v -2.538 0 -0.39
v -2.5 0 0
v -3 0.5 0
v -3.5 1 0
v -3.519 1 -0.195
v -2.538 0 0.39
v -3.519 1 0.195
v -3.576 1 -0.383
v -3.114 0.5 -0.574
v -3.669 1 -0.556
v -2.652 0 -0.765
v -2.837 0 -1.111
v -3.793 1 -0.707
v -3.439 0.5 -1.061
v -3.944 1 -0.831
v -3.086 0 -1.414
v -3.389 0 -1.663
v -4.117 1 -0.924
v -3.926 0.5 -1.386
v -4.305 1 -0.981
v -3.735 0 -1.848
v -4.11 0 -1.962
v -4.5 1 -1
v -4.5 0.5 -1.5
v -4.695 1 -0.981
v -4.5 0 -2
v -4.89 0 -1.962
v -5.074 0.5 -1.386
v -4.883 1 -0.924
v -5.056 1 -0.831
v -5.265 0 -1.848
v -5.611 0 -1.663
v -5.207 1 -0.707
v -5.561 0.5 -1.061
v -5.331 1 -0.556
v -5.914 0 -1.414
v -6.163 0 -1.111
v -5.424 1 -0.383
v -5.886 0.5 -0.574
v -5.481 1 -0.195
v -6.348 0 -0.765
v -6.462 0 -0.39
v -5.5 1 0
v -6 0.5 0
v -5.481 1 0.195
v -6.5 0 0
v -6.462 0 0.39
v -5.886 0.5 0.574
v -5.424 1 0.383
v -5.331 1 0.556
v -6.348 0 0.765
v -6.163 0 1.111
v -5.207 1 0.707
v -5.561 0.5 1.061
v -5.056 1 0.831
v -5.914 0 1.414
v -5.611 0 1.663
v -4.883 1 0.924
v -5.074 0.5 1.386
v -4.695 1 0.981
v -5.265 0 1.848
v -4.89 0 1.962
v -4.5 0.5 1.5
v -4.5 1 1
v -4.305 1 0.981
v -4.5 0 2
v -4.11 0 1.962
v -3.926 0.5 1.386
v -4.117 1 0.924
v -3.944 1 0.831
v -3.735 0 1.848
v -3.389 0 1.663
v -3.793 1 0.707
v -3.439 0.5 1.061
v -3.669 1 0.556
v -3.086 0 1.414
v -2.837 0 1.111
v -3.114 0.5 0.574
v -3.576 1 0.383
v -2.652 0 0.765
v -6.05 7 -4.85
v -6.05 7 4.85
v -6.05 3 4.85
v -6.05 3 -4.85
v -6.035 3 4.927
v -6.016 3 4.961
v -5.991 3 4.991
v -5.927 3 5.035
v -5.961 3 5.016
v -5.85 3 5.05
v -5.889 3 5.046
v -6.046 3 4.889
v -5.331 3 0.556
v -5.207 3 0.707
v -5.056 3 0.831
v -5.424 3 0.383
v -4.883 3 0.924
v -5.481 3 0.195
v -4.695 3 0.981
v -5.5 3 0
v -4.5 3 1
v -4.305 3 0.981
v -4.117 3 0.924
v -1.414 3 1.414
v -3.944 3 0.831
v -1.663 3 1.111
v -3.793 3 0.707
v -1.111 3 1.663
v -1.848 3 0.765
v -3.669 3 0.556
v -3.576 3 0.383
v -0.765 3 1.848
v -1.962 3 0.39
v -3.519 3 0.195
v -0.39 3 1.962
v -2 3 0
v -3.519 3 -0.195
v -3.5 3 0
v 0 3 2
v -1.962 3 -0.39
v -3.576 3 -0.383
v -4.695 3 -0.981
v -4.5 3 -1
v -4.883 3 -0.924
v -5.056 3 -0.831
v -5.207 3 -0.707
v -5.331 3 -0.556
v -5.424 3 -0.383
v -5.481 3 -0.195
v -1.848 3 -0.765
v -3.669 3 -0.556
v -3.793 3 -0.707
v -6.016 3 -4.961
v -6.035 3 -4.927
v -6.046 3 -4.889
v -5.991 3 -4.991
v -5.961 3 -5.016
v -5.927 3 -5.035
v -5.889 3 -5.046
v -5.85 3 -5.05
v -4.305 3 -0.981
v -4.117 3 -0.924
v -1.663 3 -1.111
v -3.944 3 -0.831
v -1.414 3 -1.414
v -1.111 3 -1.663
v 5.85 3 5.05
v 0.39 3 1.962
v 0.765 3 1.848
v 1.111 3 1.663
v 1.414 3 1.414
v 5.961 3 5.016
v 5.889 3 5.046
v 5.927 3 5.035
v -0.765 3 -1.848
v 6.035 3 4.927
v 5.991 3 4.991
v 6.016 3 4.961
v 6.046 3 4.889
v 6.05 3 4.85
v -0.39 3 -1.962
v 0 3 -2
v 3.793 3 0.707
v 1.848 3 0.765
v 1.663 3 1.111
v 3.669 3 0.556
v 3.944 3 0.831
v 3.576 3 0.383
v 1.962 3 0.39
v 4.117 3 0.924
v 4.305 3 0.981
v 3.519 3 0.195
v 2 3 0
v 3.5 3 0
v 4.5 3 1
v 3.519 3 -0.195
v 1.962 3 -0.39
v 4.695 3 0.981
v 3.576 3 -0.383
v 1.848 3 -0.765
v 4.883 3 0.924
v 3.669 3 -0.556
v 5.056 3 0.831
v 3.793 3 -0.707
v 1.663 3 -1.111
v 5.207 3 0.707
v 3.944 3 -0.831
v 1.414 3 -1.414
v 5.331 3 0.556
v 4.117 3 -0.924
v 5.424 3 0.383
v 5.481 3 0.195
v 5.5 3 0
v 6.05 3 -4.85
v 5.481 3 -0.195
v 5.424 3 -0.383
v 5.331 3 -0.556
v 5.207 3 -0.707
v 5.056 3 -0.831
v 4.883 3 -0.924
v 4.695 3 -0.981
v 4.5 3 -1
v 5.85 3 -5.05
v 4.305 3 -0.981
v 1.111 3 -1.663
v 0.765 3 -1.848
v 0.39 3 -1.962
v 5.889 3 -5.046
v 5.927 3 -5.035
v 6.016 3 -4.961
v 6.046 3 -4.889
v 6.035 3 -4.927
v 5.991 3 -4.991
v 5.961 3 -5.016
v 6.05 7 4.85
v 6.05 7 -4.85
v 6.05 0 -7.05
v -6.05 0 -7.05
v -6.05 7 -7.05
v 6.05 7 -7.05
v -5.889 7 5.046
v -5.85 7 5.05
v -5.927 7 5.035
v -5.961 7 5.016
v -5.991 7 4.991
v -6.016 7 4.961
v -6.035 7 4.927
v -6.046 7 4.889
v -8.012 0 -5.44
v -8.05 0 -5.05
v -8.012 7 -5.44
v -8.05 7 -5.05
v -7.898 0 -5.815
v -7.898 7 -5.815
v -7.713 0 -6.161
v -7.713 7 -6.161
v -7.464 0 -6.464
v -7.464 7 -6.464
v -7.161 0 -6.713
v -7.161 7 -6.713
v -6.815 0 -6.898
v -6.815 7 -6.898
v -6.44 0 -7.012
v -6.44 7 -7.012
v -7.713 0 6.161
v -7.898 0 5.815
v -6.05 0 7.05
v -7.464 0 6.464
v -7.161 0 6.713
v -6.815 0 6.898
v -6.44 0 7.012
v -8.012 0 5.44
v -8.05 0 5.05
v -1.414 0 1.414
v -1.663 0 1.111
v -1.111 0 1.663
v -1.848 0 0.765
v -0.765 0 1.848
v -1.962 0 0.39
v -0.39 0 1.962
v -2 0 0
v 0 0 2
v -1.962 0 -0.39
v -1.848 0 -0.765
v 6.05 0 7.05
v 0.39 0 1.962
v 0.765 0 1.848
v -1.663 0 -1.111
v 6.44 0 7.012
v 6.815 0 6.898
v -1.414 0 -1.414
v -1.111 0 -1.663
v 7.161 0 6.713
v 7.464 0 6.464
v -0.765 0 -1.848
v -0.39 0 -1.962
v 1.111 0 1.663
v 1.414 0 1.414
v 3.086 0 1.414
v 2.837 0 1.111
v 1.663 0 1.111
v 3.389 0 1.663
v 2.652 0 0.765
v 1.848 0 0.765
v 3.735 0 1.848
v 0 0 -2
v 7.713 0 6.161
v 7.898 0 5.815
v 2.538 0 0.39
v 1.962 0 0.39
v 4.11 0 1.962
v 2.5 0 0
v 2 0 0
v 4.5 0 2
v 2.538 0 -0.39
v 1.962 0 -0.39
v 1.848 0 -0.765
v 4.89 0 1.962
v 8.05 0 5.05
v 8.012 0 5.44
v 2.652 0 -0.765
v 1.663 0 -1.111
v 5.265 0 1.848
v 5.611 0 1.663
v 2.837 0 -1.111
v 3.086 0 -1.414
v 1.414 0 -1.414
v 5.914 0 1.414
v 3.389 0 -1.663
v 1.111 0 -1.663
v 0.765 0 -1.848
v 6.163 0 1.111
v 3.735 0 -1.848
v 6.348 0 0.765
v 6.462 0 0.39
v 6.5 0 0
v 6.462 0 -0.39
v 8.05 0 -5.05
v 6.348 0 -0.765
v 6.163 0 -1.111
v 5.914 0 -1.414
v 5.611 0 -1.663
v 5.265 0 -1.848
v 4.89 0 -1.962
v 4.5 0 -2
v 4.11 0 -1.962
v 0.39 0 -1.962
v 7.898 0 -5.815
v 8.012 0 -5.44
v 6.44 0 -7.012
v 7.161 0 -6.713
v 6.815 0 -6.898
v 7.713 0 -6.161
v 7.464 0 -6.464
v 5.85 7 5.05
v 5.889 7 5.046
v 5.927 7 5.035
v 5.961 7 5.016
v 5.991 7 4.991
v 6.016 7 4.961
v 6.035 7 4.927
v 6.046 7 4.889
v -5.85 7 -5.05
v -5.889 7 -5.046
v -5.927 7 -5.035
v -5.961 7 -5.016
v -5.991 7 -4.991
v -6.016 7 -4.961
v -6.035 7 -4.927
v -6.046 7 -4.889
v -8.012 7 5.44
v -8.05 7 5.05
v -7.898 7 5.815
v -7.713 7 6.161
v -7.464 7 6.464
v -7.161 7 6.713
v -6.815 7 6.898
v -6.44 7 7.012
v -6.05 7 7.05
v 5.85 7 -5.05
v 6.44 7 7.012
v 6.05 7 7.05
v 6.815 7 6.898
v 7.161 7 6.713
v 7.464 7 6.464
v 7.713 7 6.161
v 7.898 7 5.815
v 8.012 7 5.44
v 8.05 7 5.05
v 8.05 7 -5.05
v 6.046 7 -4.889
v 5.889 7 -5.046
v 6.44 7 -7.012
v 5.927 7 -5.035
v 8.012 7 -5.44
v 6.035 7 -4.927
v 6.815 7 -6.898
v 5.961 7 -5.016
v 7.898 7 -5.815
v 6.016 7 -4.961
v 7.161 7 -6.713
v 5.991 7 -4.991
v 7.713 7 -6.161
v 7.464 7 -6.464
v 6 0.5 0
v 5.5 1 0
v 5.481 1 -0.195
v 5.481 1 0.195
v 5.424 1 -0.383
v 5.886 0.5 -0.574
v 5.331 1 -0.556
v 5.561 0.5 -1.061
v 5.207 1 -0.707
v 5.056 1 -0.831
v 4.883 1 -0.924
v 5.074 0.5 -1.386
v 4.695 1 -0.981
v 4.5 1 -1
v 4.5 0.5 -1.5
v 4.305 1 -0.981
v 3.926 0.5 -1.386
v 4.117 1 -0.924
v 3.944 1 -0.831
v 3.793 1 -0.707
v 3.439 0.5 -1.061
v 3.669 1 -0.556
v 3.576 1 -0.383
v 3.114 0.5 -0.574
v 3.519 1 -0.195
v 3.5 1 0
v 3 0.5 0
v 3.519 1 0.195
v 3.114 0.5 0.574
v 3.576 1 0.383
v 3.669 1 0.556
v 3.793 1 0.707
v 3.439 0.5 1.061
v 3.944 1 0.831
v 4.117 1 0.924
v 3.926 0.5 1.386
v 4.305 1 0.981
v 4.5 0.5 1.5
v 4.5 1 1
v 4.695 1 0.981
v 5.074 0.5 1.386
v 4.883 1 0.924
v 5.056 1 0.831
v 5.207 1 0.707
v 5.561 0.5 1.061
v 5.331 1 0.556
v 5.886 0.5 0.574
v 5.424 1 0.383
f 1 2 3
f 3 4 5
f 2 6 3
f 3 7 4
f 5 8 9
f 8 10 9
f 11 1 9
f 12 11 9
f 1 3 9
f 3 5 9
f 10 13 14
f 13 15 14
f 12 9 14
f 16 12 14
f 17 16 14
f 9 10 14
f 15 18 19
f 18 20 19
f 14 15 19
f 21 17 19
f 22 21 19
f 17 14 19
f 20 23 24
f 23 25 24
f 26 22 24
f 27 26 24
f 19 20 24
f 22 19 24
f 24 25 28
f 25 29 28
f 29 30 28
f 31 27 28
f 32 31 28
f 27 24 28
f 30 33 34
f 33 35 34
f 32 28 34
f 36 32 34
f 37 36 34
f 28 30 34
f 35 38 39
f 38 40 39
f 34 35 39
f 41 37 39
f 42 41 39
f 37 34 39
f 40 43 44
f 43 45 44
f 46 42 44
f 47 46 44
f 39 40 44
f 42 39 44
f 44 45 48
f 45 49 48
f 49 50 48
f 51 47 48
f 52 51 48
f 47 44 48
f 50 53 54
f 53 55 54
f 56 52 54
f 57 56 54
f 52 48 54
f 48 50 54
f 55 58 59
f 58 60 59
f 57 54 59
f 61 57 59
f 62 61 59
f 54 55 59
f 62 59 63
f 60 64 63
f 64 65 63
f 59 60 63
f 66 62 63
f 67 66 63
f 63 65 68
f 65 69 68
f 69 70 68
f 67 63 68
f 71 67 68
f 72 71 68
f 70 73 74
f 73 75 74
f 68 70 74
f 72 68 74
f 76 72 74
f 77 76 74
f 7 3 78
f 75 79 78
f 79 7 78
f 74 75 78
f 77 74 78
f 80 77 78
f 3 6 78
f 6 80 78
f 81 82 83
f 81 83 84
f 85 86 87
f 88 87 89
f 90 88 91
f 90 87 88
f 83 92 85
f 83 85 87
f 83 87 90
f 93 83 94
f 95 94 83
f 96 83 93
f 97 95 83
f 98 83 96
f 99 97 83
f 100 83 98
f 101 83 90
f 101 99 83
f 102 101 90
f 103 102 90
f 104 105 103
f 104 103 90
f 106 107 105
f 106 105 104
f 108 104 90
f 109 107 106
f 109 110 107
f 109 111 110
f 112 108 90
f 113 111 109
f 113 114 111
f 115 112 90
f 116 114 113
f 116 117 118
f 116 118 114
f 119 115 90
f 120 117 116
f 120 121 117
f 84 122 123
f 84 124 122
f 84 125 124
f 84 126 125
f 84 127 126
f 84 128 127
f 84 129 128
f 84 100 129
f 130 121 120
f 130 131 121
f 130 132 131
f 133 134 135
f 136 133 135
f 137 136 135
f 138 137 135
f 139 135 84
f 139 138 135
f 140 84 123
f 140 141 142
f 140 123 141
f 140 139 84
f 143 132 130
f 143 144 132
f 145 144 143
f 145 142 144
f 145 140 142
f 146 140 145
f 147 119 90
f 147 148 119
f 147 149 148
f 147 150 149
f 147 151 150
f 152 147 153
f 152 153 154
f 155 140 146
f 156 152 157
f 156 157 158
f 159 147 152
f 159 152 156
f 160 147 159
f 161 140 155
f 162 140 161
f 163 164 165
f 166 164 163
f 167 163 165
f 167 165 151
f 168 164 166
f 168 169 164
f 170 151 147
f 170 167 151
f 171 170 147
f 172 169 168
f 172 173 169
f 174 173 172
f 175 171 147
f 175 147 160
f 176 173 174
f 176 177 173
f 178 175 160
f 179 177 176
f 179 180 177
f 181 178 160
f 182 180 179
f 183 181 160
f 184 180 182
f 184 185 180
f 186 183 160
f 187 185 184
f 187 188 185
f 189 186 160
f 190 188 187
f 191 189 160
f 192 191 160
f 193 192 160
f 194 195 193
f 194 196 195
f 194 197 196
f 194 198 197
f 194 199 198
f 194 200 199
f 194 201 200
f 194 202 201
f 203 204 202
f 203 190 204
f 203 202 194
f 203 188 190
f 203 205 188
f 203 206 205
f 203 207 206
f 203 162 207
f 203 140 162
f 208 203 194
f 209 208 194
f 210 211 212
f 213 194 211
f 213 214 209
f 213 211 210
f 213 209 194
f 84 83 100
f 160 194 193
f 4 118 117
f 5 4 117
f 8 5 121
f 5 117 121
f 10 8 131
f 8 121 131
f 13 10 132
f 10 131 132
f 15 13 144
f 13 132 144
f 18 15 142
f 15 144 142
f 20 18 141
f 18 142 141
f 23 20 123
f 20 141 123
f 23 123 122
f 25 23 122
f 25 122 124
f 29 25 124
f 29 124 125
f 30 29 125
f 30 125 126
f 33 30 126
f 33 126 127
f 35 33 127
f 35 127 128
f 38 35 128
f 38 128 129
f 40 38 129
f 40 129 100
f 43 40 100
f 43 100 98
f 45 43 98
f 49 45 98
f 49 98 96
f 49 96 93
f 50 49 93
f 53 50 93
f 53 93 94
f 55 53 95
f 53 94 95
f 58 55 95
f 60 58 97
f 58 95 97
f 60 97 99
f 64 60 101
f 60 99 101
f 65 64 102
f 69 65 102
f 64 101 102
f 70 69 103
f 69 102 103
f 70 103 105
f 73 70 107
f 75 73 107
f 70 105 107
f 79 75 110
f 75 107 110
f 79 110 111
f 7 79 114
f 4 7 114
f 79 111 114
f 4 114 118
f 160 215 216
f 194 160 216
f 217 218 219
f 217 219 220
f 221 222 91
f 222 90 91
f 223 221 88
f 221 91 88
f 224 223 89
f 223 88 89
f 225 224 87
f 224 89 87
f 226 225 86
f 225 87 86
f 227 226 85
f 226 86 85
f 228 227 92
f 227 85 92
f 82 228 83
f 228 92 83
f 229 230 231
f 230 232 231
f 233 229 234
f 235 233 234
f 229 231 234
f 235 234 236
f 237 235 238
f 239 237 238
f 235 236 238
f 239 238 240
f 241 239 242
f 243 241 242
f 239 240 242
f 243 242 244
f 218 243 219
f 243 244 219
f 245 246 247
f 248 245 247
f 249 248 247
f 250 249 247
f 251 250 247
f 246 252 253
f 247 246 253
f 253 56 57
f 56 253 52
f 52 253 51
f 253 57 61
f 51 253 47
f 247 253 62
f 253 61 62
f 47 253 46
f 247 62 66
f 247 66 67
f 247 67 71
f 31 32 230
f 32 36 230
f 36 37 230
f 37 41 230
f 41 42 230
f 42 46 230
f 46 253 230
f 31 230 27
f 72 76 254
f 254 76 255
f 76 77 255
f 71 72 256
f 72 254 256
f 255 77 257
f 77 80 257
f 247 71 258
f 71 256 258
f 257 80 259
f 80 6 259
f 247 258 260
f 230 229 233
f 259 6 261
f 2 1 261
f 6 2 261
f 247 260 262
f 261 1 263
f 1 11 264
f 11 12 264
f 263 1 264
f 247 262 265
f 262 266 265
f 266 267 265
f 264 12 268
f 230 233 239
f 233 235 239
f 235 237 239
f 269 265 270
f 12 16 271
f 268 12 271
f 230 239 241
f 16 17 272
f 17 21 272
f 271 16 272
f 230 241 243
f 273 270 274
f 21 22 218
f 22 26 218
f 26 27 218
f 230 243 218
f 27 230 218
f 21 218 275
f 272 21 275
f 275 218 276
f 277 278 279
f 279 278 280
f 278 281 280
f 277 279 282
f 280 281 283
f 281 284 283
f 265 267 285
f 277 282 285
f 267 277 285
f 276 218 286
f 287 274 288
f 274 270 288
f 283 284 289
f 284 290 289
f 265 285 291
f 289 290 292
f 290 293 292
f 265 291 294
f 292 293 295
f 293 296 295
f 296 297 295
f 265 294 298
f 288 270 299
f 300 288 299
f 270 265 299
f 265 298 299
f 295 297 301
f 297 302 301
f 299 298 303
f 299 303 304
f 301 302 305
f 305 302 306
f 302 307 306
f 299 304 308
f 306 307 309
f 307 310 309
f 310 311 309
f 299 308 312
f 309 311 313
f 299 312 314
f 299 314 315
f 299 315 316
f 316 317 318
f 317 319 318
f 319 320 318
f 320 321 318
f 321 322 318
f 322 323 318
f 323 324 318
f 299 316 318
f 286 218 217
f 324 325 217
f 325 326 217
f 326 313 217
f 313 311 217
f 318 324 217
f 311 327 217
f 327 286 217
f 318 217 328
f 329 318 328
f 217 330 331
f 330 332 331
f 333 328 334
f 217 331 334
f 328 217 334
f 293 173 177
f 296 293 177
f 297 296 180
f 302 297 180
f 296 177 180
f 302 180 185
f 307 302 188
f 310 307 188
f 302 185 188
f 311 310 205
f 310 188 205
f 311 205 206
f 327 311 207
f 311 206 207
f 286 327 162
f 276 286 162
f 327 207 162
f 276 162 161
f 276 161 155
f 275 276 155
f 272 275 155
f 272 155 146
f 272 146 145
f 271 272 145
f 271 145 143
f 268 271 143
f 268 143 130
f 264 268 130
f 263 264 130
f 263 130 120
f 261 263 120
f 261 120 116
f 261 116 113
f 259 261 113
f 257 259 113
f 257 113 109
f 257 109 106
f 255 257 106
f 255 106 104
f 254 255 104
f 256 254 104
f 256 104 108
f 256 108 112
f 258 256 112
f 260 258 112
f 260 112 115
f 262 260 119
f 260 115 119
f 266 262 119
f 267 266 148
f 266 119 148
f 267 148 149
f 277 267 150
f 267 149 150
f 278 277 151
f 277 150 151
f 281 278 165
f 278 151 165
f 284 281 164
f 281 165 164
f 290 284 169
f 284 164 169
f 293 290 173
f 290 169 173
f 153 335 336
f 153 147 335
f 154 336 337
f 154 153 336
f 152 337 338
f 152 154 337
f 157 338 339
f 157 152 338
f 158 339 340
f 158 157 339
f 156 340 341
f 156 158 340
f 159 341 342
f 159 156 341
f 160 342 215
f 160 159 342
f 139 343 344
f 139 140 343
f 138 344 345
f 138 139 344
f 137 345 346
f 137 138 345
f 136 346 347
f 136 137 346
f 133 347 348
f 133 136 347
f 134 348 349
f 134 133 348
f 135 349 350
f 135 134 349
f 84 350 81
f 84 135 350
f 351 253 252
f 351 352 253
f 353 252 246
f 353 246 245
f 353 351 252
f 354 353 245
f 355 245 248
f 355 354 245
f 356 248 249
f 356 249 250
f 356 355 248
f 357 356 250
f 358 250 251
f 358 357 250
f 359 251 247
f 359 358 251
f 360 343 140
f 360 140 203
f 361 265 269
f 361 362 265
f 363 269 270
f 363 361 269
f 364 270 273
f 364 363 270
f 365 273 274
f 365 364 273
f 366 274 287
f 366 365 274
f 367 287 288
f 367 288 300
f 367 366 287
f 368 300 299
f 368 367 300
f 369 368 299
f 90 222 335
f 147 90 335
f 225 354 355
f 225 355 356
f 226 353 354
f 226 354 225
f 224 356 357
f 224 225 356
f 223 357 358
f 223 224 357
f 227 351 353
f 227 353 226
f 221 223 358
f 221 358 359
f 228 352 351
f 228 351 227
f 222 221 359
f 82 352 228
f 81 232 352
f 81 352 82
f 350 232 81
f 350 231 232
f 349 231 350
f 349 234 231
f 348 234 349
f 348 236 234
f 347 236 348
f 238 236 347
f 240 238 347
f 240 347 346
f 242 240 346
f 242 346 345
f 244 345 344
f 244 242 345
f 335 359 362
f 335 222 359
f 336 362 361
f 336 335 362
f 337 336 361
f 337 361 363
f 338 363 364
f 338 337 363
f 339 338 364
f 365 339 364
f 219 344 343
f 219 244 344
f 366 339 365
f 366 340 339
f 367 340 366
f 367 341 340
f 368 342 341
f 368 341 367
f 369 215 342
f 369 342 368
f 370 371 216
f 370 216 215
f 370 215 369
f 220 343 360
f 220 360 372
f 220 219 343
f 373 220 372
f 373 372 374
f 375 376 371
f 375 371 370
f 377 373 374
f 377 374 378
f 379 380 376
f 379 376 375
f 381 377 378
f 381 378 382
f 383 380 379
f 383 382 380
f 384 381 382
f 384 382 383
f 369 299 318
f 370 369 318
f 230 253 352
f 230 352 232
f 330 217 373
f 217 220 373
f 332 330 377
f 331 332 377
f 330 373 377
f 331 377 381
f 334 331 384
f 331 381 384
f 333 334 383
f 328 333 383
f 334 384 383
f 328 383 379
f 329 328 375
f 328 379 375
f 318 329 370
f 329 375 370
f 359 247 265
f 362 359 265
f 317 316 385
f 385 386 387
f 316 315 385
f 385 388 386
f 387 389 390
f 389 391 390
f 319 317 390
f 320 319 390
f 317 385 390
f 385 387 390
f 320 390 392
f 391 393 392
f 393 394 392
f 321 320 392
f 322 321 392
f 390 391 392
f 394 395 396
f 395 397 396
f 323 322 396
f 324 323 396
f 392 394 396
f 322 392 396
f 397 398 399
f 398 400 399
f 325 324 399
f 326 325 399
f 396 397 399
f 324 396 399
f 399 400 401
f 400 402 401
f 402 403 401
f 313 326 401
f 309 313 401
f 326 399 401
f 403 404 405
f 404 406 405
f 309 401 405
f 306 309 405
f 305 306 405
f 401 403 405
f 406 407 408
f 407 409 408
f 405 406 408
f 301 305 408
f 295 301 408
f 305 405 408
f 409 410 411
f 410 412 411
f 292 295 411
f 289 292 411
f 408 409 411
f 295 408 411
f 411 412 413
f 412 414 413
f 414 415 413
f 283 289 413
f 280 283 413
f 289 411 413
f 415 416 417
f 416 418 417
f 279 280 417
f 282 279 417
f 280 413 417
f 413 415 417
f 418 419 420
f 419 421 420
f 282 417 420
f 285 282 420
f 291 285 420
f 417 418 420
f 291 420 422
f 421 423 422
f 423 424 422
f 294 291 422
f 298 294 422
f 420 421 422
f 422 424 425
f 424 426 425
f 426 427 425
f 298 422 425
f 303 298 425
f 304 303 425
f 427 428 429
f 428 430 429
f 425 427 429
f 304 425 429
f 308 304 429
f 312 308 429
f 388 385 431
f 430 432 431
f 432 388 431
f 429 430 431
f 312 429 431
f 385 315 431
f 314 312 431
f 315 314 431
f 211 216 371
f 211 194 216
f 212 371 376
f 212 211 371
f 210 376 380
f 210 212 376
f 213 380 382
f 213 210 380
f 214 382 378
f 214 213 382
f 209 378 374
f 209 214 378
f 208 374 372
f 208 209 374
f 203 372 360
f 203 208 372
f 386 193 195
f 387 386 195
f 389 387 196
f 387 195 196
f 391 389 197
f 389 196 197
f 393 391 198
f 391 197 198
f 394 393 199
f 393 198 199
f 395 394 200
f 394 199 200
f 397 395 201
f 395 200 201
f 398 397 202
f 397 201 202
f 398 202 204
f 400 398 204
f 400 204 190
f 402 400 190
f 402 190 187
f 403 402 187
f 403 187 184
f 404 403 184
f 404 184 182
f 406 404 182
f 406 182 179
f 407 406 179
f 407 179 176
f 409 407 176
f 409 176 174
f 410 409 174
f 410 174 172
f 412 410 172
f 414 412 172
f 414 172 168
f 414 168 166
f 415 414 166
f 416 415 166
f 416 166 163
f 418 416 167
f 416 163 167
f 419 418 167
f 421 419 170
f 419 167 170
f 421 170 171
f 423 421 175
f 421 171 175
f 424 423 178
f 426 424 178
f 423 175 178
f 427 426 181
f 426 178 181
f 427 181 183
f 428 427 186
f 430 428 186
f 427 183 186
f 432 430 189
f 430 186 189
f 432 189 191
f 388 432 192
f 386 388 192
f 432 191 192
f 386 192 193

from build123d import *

# Parameters (mm, degrees)
SKETCH1_W                                            = 16.1
SKETCH1_H                                            = 14.1
BOSS_EXTRUDE1_DEPTH                                  = 7
SKETCH3_W                                            = 12.1
SKETCH3_H                                            = 10.1
CUT_EXTRUDE1_DEPTH                                   = 4
CSK_FOR_M1_6_COUNTERSUNK_FLAT_HEAD_SCREW_D           = 2
CSK_FOR_M1_6_COUNTERSUNK_FLAT_HEAD_SCREW_DEPTH       = 3
CSK_FOR_M1_6_COUNTERSUNK_FLAT_HEAD_SCREW_CSINK_D     = 4
CSK_FOR_M1_6_COUNTERSUNK_FLAT_HEAD_SCREW_CSINK_ANGLE = 90
SKETCH8_R                                            = 2
CUT_EXTRUDE2_DEPTH                                   = 4
FILLET1_R                                            = 2
FILLET2_R                                            = 0.2


with BuildPart() as part:
    # Sketch1 → Boss-Extrude1 (new body)
    with BuildSketch(Plane(origin=(0, 0, 0), x_dir=(1, 0, 0), z_dir=(0, 1, 0))):
        Rectangle(SKETCH1_W, SKETCH1_H)
    extrude(amount=BOSS_EXTRUDE1_DEPTH)

    # Sketch3 → Cut-Extrude1 (cut)
    with BuildSketch(Plane(origin=(0, 7, 0), x_dir=(1, 0, 0), z_dir=(0, 1, 0))):
        Rectangle(SKETCH3_W, SKETCH3_H)
    extrude(amount=-CUT_EXTRUDE1_DEPTH, mode=Mode.SUBTRACT)

    # CSK for M1.6 Countersunk Flat Head Screw1
    with Locations(Plane(origin=(0, 0, 0), x_dir=(-1, 0, 0), z_dir=(0, -1, 0))):
        with Locations((4.5, 0), (-4.5, 0)):
            CounterSinkHole(CSK_FOR_M1_6_COUNTERSUNK_FLAT_HEAD_SCREW_D / 2, CSK_FOR_M1_6_COUNTERSUNK_FLAT_HEAD_SCREW_CSINK_D / 2, depth=CSK_FOR_M1_6_COUNTERSUNK_FLAT_HEAD_SCREW_DEPTH, counter_sink_angle=CSK_FOR_M1_6_COUNTERSUNK_FLAT_HEAD_SCREW_CSINK_ANGLE)

    # Sketch8 → Cut-Extrude2 (cut, through all)
    with BuildSketch(Plane(origin=(0, 3, 0), x_dir=(1, 0, 0), z_dir=(0, 1, 0))):
        Circle(SKETCH8_R)
    extrude(amount=-CUT_EXTRUDE2_DEPTH, mode=Mode.SUBTRACT)

    # Fillet1
    fillet1_edges = [part.edges().sort_by_distance(p)[0] for p in [
        (-8.05, 3.5, -7.05),
        (8.05, 3.5, -7.05),
        (8.05, 3.5, 7.05),
        (-8.05, 3.5, 7.05),
    ]]
    fillet(fillet1_edges, radius=FILLET1_R)

    # Fillet2
    fillet2_edges = [part.edges().sort_by_distance(p)[0] for p in [
        (-6.05, 5, 5.05),
        (-6.05, 5, -5.05),
        (6.05, 5, -5.05),
        (6.05, 5, 5.05),
    ]]
    fillet(fillet2_edges, radius=FILLET2_R)


solid = part.part
